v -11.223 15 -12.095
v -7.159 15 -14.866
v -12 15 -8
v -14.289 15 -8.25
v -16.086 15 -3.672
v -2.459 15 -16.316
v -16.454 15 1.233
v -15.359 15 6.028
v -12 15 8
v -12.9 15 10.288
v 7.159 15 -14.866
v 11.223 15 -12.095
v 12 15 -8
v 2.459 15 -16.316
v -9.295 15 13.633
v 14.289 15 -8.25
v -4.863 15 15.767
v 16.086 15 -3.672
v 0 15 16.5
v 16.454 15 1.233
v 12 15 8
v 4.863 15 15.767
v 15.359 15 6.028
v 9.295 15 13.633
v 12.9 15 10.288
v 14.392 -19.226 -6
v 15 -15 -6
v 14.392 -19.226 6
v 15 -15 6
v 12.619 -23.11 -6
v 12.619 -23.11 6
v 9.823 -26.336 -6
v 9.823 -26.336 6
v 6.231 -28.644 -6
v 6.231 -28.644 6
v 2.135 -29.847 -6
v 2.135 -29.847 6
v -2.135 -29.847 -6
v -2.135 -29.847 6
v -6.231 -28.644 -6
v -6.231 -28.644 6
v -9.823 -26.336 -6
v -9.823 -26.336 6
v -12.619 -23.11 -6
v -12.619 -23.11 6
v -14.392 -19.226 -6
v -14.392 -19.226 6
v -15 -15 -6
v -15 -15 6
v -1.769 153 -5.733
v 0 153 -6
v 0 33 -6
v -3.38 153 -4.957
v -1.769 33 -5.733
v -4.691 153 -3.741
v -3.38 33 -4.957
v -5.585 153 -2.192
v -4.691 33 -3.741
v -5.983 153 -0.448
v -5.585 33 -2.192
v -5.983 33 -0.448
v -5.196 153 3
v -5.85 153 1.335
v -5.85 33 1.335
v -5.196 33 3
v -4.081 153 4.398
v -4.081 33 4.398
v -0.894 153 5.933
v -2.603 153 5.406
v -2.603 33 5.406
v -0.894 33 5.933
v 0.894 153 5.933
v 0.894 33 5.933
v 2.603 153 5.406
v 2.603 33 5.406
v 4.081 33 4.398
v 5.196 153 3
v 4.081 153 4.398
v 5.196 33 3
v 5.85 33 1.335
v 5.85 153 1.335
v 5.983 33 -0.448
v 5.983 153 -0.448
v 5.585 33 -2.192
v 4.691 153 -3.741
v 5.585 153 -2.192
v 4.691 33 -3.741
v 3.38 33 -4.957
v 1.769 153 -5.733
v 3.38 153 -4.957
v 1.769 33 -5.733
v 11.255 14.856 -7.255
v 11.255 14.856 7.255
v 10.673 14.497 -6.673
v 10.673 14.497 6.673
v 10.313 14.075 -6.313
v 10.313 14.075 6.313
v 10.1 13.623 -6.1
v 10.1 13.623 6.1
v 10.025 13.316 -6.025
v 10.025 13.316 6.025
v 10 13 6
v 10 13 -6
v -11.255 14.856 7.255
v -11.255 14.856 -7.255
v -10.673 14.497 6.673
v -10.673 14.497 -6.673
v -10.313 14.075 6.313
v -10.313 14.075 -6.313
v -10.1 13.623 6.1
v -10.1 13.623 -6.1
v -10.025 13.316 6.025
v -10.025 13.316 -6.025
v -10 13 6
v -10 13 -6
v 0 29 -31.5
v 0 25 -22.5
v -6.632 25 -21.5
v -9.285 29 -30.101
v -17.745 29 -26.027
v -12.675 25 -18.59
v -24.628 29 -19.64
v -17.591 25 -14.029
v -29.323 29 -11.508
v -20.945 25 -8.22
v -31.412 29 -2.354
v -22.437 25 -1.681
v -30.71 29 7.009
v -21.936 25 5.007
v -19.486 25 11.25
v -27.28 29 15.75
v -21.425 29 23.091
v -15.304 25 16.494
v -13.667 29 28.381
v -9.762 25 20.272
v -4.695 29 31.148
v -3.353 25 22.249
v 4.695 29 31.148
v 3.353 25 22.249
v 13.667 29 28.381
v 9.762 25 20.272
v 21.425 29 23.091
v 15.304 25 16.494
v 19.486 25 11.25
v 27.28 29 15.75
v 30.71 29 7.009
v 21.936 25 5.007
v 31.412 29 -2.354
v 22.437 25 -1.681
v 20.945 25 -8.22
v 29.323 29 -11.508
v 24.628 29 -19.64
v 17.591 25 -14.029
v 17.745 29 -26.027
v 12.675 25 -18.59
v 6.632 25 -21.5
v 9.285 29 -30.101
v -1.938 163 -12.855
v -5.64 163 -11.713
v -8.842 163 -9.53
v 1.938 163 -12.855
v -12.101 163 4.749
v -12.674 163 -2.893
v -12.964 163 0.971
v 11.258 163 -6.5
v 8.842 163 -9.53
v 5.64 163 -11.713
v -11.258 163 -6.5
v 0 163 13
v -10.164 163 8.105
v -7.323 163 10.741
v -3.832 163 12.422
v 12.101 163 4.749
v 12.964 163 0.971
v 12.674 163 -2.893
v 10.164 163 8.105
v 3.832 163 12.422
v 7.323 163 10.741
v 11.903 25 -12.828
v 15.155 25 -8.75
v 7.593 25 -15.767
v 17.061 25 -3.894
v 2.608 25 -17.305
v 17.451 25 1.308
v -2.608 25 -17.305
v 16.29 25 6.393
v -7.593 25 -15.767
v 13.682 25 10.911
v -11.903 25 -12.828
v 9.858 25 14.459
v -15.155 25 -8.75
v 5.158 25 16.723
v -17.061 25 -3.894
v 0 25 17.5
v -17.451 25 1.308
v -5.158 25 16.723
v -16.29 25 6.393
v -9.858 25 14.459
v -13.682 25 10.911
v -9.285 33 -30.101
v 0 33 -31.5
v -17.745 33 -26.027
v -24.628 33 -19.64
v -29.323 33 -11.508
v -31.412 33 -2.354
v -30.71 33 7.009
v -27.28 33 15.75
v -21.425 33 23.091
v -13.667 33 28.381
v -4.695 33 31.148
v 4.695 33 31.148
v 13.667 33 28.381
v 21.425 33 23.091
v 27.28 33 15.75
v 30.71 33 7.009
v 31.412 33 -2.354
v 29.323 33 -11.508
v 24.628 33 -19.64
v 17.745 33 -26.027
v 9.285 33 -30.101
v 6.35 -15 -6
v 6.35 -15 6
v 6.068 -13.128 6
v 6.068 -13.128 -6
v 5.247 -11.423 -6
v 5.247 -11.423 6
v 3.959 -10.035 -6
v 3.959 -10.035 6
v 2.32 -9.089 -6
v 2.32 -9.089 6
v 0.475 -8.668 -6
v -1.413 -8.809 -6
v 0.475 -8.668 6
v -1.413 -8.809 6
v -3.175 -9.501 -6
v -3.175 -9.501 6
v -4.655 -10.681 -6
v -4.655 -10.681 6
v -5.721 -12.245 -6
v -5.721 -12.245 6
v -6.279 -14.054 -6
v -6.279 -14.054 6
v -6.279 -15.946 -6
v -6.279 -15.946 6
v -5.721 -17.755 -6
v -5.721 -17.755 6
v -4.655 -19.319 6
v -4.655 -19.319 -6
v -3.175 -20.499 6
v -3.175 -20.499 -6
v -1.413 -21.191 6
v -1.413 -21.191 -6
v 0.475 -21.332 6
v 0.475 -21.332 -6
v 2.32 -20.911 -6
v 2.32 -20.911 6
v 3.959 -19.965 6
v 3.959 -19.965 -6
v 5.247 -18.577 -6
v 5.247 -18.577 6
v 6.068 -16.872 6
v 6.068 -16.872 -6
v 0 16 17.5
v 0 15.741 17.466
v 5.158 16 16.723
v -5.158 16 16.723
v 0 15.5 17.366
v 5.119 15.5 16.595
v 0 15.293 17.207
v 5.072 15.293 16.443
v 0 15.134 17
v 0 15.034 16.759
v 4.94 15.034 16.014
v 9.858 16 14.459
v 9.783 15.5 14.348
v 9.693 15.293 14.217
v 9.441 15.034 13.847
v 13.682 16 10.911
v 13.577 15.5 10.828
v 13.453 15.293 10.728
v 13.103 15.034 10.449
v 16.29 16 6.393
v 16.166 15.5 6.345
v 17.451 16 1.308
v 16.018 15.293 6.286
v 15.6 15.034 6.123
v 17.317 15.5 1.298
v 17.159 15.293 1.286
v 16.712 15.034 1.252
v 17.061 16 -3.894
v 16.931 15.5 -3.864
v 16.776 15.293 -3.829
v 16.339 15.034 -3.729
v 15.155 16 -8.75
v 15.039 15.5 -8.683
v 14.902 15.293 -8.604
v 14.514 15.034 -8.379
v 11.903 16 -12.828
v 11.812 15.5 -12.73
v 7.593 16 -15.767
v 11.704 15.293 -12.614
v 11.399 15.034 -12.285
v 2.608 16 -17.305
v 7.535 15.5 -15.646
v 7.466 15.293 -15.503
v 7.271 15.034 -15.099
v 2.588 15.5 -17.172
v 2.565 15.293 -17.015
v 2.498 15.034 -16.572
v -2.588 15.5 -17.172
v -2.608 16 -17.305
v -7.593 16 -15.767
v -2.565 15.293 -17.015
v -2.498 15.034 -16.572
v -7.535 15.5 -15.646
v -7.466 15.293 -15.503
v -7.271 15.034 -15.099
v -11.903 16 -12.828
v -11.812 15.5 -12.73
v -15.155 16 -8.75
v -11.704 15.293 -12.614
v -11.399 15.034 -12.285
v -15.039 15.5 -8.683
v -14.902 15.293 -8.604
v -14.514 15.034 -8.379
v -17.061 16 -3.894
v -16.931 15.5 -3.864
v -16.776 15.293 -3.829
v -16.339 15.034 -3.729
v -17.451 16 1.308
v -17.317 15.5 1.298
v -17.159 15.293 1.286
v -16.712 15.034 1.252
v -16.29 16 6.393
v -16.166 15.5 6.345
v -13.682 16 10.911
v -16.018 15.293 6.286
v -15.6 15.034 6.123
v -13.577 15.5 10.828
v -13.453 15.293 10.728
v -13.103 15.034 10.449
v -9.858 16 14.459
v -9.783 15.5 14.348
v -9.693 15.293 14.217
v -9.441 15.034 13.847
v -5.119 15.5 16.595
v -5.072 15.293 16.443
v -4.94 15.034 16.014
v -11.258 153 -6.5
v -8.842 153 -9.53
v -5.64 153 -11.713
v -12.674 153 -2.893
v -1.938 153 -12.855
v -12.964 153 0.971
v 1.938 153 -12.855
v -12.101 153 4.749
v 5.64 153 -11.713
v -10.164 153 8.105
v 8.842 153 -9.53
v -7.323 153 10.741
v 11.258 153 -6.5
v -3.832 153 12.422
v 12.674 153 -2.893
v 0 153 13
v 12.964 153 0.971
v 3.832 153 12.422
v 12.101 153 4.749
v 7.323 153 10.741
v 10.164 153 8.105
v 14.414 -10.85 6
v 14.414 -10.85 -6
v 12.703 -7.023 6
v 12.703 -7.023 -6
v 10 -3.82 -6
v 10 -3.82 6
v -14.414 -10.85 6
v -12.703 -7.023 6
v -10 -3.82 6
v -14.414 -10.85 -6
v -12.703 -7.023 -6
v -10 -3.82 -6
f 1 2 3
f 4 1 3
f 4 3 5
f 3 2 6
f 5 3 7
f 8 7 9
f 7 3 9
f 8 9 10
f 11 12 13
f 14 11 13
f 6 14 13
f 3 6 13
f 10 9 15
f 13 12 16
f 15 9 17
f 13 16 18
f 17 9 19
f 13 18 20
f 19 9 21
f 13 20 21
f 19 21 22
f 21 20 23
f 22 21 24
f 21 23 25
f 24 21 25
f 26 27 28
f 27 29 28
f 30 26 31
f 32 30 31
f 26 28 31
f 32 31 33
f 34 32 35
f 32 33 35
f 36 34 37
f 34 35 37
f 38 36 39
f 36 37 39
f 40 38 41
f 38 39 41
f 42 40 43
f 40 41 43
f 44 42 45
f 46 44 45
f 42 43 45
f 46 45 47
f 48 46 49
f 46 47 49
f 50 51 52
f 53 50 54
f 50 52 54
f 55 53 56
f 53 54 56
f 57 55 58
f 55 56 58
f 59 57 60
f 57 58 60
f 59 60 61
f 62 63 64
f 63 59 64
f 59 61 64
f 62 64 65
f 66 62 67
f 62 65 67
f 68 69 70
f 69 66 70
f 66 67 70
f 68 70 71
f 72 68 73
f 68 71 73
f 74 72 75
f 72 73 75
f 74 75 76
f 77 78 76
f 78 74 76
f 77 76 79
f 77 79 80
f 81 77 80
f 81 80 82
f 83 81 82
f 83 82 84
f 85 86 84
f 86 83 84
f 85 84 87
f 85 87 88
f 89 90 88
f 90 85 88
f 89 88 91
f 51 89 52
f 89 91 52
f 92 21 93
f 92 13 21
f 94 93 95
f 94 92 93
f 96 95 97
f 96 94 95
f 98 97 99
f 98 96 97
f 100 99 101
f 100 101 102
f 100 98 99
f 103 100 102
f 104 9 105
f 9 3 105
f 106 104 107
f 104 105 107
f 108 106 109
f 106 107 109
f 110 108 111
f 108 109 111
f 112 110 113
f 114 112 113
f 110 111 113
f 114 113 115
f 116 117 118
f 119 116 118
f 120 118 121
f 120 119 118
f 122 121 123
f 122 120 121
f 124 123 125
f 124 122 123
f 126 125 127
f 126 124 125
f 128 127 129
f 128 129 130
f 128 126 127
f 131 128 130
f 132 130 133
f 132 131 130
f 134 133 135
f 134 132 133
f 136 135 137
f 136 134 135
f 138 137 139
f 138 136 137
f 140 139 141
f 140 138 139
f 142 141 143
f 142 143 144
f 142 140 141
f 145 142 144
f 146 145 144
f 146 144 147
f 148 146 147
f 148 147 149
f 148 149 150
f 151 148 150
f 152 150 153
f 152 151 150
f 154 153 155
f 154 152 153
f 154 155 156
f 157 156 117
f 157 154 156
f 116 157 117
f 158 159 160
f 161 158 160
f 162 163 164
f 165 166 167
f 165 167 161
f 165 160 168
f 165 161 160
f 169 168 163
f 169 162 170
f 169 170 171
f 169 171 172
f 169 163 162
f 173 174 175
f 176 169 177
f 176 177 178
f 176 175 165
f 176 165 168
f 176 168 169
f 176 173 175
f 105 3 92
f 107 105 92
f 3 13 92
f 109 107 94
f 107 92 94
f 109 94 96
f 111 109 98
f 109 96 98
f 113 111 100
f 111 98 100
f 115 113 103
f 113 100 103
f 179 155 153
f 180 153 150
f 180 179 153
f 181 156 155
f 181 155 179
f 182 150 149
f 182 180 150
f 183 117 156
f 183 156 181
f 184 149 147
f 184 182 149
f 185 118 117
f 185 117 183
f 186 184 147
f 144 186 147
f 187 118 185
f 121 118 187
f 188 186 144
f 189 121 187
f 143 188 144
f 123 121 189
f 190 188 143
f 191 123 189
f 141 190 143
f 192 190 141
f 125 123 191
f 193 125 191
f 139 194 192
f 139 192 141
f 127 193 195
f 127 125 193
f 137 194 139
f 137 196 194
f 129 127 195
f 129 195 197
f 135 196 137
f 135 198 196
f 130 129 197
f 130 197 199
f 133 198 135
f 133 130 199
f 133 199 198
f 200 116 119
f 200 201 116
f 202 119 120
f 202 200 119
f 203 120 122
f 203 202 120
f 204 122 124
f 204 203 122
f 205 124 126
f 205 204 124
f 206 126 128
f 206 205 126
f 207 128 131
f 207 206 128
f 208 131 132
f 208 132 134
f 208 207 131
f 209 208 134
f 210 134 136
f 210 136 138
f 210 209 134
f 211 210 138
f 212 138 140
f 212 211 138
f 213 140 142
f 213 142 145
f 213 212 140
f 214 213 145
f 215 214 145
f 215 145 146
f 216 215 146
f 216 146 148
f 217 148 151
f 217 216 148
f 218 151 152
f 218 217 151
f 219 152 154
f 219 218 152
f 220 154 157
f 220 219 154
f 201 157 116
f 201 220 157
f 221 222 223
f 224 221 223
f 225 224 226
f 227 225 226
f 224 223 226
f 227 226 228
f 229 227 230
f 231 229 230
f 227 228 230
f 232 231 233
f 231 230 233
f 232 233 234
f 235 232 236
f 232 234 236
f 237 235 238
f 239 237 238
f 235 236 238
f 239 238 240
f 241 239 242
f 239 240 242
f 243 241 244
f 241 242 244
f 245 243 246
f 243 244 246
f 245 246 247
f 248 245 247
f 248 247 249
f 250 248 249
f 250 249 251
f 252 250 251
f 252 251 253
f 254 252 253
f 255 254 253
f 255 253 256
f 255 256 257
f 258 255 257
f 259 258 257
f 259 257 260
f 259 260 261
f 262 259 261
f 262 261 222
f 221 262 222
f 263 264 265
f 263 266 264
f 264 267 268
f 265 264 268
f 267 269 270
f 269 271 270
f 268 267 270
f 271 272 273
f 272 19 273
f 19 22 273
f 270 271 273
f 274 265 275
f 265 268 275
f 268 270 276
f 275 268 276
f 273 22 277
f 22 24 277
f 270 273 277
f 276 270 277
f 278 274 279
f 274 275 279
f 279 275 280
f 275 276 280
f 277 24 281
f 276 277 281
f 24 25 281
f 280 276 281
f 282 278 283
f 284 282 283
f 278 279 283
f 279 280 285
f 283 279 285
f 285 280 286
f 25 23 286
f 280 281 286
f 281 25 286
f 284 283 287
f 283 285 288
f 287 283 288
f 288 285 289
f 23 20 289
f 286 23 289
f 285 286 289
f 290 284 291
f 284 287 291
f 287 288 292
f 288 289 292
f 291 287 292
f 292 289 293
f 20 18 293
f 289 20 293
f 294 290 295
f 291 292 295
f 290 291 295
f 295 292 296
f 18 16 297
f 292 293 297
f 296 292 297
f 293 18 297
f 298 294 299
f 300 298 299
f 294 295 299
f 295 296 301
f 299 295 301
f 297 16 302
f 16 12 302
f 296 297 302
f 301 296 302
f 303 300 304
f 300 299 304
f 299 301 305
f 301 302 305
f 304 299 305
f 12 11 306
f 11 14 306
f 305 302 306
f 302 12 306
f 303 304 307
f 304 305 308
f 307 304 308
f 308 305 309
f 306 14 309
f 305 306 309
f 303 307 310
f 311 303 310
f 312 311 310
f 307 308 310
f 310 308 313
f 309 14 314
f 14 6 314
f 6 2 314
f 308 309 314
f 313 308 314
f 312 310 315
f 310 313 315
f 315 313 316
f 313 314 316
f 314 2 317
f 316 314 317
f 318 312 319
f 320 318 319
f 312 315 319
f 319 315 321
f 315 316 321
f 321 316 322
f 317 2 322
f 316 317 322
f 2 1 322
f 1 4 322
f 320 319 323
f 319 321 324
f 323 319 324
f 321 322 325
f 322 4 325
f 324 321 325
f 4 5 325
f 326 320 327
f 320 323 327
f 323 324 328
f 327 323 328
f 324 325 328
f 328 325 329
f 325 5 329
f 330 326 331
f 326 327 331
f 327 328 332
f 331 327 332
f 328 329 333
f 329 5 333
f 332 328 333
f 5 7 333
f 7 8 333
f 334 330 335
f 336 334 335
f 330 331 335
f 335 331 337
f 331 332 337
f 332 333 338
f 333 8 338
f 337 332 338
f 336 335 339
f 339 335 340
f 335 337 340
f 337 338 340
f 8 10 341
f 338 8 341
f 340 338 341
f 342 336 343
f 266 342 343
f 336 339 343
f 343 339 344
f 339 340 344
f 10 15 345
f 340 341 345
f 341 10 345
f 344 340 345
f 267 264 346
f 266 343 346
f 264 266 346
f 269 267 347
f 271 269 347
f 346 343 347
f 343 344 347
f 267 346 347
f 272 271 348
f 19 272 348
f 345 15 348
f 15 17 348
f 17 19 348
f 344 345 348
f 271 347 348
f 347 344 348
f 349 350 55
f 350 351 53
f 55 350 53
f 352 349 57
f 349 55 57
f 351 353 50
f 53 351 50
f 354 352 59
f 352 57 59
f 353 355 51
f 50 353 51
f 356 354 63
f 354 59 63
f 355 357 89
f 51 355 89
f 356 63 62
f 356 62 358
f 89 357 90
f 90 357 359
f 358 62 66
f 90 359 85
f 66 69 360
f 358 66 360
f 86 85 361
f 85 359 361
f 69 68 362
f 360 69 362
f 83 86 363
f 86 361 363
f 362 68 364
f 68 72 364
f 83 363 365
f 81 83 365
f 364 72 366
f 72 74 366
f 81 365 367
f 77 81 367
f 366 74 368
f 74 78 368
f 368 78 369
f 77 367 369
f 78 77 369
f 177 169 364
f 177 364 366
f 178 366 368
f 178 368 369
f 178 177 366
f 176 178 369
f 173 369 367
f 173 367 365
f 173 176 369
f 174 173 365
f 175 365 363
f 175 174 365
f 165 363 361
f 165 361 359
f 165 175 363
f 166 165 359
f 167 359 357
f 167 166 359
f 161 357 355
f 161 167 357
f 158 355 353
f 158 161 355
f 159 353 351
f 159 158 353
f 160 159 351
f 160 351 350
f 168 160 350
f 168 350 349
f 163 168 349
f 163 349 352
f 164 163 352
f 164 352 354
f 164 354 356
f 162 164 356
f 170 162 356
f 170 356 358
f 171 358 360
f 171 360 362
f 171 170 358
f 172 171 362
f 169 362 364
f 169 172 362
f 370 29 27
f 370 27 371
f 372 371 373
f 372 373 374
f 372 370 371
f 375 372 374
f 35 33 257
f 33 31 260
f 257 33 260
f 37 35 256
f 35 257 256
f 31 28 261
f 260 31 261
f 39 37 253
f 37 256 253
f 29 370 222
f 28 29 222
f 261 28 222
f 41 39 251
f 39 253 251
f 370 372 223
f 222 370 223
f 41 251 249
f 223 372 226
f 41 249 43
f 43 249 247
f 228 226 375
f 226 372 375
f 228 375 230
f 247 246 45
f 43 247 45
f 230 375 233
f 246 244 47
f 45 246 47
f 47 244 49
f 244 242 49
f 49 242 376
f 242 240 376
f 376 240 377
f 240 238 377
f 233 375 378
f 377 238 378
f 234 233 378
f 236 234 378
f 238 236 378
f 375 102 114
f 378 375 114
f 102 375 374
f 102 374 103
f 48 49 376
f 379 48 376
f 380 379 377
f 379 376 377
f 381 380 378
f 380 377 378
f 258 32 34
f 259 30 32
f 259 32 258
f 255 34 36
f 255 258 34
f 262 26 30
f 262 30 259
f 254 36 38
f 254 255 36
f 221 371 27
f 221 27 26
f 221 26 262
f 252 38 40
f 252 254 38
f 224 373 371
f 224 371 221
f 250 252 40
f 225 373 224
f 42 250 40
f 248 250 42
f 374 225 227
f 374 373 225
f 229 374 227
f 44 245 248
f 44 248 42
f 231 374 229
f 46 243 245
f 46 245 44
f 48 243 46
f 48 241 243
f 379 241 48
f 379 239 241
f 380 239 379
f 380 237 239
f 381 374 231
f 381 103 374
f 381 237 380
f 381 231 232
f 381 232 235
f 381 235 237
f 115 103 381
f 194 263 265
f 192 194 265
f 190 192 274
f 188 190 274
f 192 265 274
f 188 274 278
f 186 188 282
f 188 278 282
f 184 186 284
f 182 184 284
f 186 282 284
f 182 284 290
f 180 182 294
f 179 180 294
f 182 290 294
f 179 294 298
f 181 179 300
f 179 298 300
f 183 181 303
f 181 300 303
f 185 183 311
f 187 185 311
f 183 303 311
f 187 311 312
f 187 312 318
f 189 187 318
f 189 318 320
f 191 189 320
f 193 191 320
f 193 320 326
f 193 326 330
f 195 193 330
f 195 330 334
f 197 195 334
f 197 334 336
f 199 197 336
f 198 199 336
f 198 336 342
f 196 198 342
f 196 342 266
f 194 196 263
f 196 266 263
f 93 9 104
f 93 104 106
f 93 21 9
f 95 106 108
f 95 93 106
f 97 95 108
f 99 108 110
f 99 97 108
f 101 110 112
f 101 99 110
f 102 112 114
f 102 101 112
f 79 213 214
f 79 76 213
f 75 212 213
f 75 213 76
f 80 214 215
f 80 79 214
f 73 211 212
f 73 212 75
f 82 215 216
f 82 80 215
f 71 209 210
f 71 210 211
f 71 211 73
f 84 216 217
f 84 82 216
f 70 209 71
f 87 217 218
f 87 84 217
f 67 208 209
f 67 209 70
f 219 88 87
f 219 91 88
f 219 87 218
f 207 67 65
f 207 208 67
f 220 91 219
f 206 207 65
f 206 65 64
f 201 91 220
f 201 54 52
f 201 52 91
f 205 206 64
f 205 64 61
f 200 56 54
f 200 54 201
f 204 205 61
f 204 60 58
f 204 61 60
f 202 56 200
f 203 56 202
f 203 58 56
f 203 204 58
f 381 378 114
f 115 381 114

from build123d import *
from build123d.topology import SkipClean

# Parameters (mm, degrees)
BOSS_EXTRUDE1_DEPTH = 6
SKETCH2_R           = 6.35
CUT_EXTRUDE1_DEPTH  = 36.623026261
CUT_EXTRUDE2_DEPTH  = 36.623026261
SKETCH4_R           = 17.5
BOSS_EXTRUDE2_DEPTH = 10
FILLET3_R           = 1
FILLET4_R           = 2
SKETCH6_R           = 6
BOSS_EXTRUDE3_DEPTH = 130
SKETCH7_R           = 13
BOSS_EXTRUDE4_DEPTH = 10


with BuildPart() as part:
    # Sketch1 → Boss-Extrude1 (new, symmetric)
    with BuildSketch(Plane.XY):
        with BuildLine():
            Line((-15, 15), (15, 15))
            Line((15, 15), (15, -15))
            ThreePointArc((15, -15), (0, -30), (-15, -15))
            Line((-15, -15), (-15, 15))
        make_face()
    extrude(amount=BOSS_EXTRUDE1_DEPTH, both=True)

    # Sketch2 → Cut-Extrude1 (cut, through all)
    with BuildSketch(Plane.XY.offset(6)):
        with Locations((0, -15)):
            Circle(SKETCH2_R)
    extrude(amount=-CUT_EXTRUDE1_DEPTH, mode=Mode.SUBTRACT)

    # Sketch3 → Cut-Extrude2 (cut, through all)
    with SkipClean():  # the faces are left unmerged after this step: merging them gives an invalid solid
        with BuildSketch(Plane.XY.offset(6)):
            with BuildLine():
                Line((-10, -3.819660113), (-10, 15))
                Line((-10, 15), (-15, 15))
                Line((-15, 15), (-15, -15))
                ThreePointArc((-15, -15), (-13.693063938, -8.876275643), (-10, -3.819660113))
            make_face()
            with BuildLine():
                Line((15, 15), (15, -15))
                ThreePointArc((15, -15), (13.693063938, -8.876275643), (10, -3.819660113))
                Line((10, -3.819660113), (10, 15))
                Line((10, 15), (15, 15))
            make_face()
        extrude(amount=-CUT_EXTRUDE2_DEPTH, mode=Mode.SUBTRACT)

    # Sketch4 → Boss-Extrude2 (add)
    with BuildSketch(Plane(origin=(0, 15, 0), x_dir=(1, 0, 0), z_dir=(0, 1, 0))):
        with Locations(Location((0, 0, 0), (0, 0, 270))):
            Circle(SKETCH4_R)
    extrude(amount=BOSS_EXTRUDE2_DEPTH)

    # Fillet3
    fillet3_edges = [part.edges().sort_by_distance(p)[0] for p in [
        (0, 15, -17.5),
    ]]
    fillet(fillet3_edges, radius=FILLET3_R)

    # Fillet4
    fillet4_edges = [part.edges().sort_by_distance(p)[0] for p in [
        (-10, 15, 0),
        (0, 15, -6),
        (0, 15, 6),
        (10, 15, 0),
    ]]
    fillet(fillet4_edges, radius=FILLET4_R)

    # Sketch5 → Revolve1 (revolve)
    with BuildSketch(Plane(origin=(0, 0, 0), x_dir=(0, 0, -1), z_dir=(1, 0, 0)), mode=Mode.PRIVATE) as revolve1_sk:
        Polygon((0, 25), (-22.5, 25), (-31.5, 29), (-31.5, 33), (0, 33), align=None)
    revolve(revolve1_sk.sketch.rotate(Axis((0, 0, 0), (0, 1, 0)), 180), axis=Axis((0, 0, 0), (0, 1, 0)))

    # Sketch6 → Boss-Extrude3 (add)
    with BuildSketch(Plane(origin=(0, 33, 0), x_dir=(1, 0, 0), z_dir=(0, 1, 0))):
        with Locations(Location((0, 0, 0), (0, 0, 90))):
            Circle(SKETCH6_R)
    extrude(amount=BOSS_EXTRUDE3_DEPTH)

    # Sketch7 → Boss-Extrude4 (add)
    with BuildSketch(Plane(origin=(0, 163, 0), x_dir=(1, 0, 0), z_dir=(0, 1, 0))):
        with Locations(Location((0, 0, 0), (0, 0, 270))):
            Circle(SKETCH7_R)
    extrude(amount=-BOSS_EXTRUDE4_DEPTH)


solid = part.part
